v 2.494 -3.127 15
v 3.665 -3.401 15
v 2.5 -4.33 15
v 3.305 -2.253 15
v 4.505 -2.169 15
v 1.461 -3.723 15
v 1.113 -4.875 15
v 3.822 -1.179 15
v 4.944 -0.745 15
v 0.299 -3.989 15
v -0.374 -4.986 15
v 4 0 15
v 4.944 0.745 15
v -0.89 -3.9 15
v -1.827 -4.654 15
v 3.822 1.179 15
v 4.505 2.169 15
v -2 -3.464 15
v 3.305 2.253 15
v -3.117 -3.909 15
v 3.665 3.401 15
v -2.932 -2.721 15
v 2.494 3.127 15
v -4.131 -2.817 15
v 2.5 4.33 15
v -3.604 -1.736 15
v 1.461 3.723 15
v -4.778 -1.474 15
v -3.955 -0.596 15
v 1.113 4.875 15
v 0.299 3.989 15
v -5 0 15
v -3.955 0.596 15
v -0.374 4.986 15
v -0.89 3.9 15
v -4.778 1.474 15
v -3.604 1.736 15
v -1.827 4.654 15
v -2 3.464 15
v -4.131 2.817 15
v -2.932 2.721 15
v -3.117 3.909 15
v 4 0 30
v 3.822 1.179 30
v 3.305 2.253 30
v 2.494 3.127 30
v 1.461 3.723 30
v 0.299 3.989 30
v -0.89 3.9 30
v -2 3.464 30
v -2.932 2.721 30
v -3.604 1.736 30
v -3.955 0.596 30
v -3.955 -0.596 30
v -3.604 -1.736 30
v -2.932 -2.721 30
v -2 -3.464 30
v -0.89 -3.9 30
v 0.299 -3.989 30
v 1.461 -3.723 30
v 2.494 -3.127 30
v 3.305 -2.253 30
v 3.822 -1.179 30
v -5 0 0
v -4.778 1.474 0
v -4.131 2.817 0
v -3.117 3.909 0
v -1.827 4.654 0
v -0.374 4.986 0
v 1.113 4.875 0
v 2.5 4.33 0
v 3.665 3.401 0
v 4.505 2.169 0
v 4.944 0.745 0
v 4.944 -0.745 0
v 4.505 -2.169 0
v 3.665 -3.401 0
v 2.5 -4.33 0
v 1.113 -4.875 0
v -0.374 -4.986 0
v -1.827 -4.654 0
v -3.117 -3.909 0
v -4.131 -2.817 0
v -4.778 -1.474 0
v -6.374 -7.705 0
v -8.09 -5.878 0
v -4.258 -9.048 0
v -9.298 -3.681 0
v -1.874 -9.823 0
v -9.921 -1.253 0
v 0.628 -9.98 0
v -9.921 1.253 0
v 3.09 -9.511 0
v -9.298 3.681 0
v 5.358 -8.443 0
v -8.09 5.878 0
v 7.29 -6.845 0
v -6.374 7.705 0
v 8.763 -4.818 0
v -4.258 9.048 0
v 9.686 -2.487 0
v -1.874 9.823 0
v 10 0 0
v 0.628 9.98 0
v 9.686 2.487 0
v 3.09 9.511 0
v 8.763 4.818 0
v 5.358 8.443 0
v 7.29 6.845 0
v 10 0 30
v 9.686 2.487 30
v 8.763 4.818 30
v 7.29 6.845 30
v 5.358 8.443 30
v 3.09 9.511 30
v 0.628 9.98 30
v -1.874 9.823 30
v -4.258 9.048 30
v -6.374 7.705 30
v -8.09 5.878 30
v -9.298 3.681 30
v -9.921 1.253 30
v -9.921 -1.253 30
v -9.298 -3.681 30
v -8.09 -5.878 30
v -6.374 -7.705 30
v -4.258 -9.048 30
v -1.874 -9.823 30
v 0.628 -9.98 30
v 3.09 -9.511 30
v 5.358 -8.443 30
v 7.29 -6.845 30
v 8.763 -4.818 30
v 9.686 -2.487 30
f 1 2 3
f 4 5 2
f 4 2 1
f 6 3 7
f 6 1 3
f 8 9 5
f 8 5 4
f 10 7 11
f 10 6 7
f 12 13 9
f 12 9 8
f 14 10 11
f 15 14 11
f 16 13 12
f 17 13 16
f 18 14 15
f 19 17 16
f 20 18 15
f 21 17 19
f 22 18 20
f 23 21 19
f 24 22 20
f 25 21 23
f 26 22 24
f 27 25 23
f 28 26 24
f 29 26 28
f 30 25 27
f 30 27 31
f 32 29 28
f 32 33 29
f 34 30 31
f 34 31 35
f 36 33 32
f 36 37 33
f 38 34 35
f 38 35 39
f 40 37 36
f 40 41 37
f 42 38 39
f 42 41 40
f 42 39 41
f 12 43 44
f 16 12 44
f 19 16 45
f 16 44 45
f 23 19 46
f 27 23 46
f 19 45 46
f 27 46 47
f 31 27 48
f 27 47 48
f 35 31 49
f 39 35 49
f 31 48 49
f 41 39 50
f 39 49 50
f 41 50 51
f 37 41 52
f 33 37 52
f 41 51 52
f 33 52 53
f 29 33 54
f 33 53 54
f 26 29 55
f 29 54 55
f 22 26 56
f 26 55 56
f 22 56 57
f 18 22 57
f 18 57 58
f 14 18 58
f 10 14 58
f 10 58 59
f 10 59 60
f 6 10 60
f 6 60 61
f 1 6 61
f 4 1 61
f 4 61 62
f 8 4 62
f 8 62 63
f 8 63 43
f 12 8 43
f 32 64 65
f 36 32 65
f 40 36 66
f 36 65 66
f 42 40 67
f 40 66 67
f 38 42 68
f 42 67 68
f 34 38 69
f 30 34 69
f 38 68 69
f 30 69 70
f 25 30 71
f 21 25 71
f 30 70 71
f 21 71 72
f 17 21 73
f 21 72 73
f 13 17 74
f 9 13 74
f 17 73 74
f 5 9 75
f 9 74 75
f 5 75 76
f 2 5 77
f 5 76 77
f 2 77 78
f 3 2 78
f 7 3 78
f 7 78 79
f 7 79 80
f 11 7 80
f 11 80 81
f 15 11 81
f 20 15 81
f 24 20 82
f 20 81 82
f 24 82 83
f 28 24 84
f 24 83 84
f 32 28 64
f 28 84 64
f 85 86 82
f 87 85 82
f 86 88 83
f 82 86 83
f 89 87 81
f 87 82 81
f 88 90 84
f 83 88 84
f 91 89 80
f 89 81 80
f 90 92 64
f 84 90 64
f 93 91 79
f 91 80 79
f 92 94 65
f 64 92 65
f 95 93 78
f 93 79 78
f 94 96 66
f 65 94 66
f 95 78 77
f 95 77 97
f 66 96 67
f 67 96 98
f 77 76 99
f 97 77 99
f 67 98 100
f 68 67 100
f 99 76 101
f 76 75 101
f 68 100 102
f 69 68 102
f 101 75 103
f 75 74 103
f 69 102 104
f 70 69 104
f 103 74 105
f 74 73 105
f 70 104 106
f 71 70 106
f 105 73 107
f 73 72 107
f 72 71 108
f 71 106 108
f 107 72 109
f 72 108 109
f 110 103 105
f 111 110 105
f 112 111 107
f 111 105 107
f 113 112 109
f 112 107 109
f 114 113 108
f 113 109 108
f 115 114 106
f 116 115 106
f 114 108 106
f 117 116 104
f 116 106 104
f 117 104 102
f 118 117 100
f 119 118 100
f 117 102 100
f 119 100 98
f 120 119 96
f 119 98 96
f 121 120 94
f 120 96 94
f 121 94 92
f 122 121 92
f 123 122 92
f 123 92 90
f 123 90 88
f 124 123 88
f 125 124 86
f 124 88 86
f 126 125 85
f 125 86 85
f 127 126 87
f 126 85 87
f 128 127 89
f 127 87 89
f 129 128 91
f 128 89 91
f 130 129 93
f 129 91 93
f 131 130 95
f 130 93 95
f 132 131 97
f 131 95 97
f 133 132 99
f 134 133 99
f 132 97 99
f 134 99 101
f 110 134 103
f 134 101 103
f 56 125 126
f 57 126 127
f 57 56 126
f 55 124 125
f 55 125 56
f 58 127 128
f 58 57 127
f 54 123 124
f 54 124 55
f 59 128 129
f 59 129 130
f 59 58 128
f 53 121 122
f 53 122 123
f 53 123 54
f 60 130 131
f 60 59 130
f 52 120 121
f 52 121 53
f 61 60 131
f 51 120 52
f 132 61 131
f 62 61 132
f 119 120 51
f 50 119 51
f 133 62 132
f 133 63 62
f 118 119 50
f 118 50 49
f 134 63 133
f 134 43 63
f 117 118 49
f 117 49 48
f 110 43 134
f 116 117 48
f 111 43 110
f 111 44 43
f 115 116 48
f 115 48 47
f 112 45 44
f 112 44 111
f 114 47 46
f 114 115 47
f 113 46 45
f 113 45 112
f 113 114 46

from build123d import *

# Parameters (mm, degrees)
SKETCH1_R           = 10
SKETCH1_R_2         = 0.065570397
BOSS_EXTRUDE1_DEPTH = 30
SKETCH2_R           = 4
CUT_EXTRUDE1_DEPTH  = 30
SKETCH3_R           = 5
CUT_EXTRUDE2_DEPTH  = 15


with BuildPart() as part:
    # Sketch1 → Boss-Extrude1 (new body)
    with BuildSketch(Plane.XY):
        Circle(SKETCH1_R)
        Circle(SKETCH1_R_2, mode=Mode.SUBTRACT)
    extrude(amount=BOSS_EXTRUDE1_DEPTH)

    # Sketch2 → Cut-Extrude1 (cut)
    with BuildSketch(Plane.XY.offset(30)):
        Circle(SKETCH2_R)
    extrude(amount=-CUT_EXTRUDE1_DEPTH, mode=Mode.SUBTRACT)

    # Sketch3 → Cut-Extrude2 (cut)
    with BuildSketch(Plane(origin=(0, 0, 0), x_dir=(-1, 0, 0), z_dir=(0, 0, -1))):
        Circle(SKETCH3_R)
    extrude(amount=-CUT_EXTRUDE2_DEPTH, mode=Mode.SUBTRACT)


solid = part.part
